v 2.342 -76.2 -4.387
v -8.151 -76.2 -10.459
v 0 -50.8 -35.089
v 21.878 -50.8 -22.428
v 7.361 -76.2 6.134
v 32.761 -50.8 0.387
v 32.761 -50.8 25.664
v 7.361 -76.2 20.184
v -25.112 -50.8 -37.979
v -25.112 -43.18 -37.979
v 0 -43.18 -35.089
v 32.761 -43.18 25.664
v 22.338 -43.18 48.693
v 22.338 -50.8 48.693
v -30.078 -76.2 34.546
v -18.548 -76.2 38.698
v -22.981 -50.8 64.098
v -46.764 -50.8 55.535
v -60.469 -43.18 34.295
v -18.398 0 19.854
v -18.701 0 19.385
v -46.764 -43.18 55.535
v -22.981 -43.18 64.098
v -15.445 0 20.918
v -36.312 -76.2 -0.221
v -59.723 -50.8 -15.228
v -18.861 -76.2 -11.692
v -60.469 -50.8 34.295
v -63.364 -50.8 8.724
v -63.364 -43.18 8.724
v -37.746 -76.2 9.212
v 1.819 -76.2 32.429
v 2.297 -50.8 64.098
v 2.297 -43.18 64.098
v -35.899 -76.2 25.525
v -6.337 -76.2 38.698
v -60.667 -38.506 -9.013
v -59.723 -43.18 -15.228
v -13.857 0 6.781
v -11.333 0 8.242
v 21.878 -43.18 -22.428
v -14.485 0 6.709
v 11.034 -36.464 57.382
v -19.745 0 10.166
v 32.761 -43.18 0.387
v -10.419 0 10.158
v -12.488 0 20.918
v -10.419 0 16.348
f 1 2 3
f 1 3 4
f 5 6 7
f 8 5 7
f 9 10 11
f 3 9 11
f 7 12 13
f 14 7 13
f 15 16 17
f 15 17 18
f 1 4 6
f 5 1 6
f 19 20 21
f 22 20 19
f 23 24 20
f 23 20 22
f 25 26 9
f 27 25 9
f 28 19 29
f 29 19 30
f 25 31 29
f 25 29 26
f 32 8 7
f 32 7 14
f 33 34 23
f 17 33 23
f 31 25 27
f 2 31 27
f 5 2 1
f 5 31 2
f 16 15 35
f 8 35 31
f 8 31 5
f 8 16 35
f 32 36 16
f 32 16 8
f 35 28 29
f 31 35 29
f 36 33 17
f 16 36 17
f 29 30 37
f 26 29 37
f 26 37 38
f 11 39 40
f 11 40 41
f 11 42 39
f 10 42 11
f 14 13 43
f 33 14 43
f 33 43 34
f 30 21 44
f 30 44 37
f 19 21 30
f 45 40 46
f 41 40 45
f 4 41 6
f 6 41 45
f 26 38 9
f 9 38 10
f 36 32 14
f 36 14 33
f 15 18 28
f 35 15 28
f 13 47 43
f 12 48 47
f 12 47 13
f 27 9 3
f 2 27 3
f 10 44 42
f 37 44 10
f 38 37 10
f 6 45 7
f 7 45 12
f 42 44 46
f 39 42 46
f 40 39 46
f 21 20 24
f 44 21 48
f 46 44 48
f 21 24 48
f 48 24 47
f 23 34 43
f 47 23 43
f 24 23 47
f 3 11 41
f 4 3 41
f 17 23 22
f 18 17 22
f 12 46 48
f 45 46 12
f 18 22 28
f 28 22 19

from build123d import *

# Parameters (mm, degrees)
F1_DEPTH     = 76.2
F2_SIZE      = 25.4
F3_T1_DEPTH  = 325.0997163693
F3_T3_DEPTH  = 325.0997163693
F3_T5_DEPTH  = 247.368026375
F3_T7_DEPTH  = 325.557153853
F3_T9_DEPTH  = 263.50961712
F3_T11_DEPTH = 247.368026375
F3_T13_DEPTH = 247.368026375
F3_T15_DEPTH = 247.368026375
F3_T17_DEPTH = 247.368026375
F3_T19_DEPTH = 247.368026375
F3_T24_DEPTH = 324.0493372034
F3_T29_DEPTH = 324.0493372034
F3_T34_DEPTH = 247.368026375
F3_T39_DEPTH = 247.368026375


# Not quite as in the source:
# - a fillet or chamfer that OpenCascade refuses, or shapes differently, is made with other operations: its cross-section is extruded or revolved along the edge and cut away or added


with BuildPart() as f1:
    # F0 (on Front) → F1 (new body)
    with BuildSketch(Plane.XZ):
        Polygon((-22.9806532577, 64.0975162387), (-46.7637702823, 55.5351264775), (-60.4687564512, 34.2954342025), (-63.3636489511, 8.723853156), (-59.7226433456, -15.2280917391), (-25.1116699455, -37.9793605928), (0, -35.0888232076), (21.8782797456, -22.4281735718), (32.7606478844, 0.3868486179), (32.7606478844, 25.6643321522), (22.3381376327, 48.6930632045), (2.2968302766, 64.0975162387), align=None)
    extrude(amount=F1_DEPTH)

    # F2
    f2_edges = [f1.edges().sort_by_distance(p)[0] for p in [
        (-61.543146, -76.2, -3.252119),
        (-42.417157, -76.2, -26.603726),
        (-12.555835, -76.2, -36.534092),
        (10.93914, -76.2, -28.758498),
        (27.319464, -76.2, -11.020662),
        (32.760648, -76.2, 13.02559),
        (27.549393, -76.2, 37.178698),
        (12.317484, -76.2, 56.39529),
        (-10.341911, -76.2, 64.097516),
        (-34.872212, -76.2, 59.816321),
        (-53.616263, -76.2, 44.91528),
        (-61.916203, -76.2, 21.509644),
    ]]
    chamfer(f2_edges, length=F2_SIZE)

    # F3: chamfer of 43.18 on 12 edges, made by hand

    # F3_s2 → F3_t1 (cut)
    with BuildSketch(Plane.YZ.offset(-211.7576146723)):
        Polygon((-43.18, 64.0975162387), (0, 20.9175162387), (0, 64.0975162387), align=None)
    extrude(amount=F3_T1_DEPTH, mode=Mode.SUBTRACT)

    # F3_s4 → F3_t3 (cut)
    with BuildSketch(Plane(origin=(177.7014842233, 0, 63.9760283522), x_dir=(0, 1, 0), z_dir=(-0.9408815158, 0, -0.3387358457))):
        Polygon((0, -24.9125392558), (-43.18, -68.0925392558), (0, -68.0925392558), align=None)
    extrude(amount=F3_T3_DEPTH, mode=Mode.SUBTRACT)

    # F3_s6 → F3_t5 (cut)
    with BuildSketch(Plane(origin=(71.76035528, 0, 111.212652454), x_dir=(0, 1, 0), z_dir=(-0.5421815882, 0, -0.8402613435))):
        Polygon((0, -26.2239115206), (-43.18, -69.4039115206), (0, -69.4039115206), align=None)
    extrude(amount=F3_T5_DEPTH, mode=Mode.SUBTRACT)

    # F3_s8 → F3_t7 (cut)
    with BuildSketch(Plane(origin=(15.5595712054, 0, 137.4430436178), x_dir=(0, 1, 0), z_dir=(-0.1124888822, 0, -0.9936529834))):
        Polygon((0, -20.7628153082), (-43.18, -63.9428153082), (0, -63.9428153082), align=None)
    extrude(amount=F3_T7_DEPTH, mode=Mode.SUBTRACT)

    # F3_s10 → F3_t9 (cut)
    with BuildSketch(Plane(origin=(-127.5057052722, 0, 83.8149377508), x_dir=(0, 1, 0), z_dir=(0.8356288498, 0, -0.5492944796))):
        Polygon((0, -2.3503510843), (-43.18, -45.5303510843), (0, -45.5303510843), align=None)
    extrude(amount=F3_T9_DEPTH, mode=Mode.SUBTRACT)

    # F3_s12 → F3_t11 (cut)
    with BuildSketch(Plane(origin=(-139.4146792436, 0, -16.0476520785), x_dir=(0, 1, 0), z_dir=(0.9934402652, 0, 0.1143522606))):
        Polygon((0, 8.3213501676), (-43.18, -34.8586498324), (0, -34.8586498324), align=None)
    extrude(amount=F3_T11_DEPTH, mode=Mode.SUBTRACT)

    # F3_s14 → F3_t13 (cut)
    with BuildSketch(Plane(origin=(-111.323834941, 0, -64.4215215589), x_dir=(0, 1, 0), z_dir=(0.8655244386, 0, 0.500866695))):
        Polygon((0, 12.8097659916), (-43.18, -30.3702340084), (0, -30.3702340084), align=None)
    extrude(amount=F3_T13_DEPTH, mode=Mode.SUBTRACT)

    # F3_s16 → F3_t15 (cut)
    with BuildSketch(Plane(origin=(-52.4668465727, 0, -109.9974062184), x_dir=(0, 1, 0), z_dir=(0.4305162784, 0, 0.9025828128))):
        Polygon((0, 13.7773469096), (-43.18, -29.4026530904), (0, -29.4026530904), align=None)
    extrude(amount=F3_T15_DEPTH, mode=Mode.SUBTRACT)

    # F3_s18 → F3_t17 (cut)
    with BuildSketch(Plane.XY.offset(-110.6584228025)):
        Polygon((-10.4193521156, 0), (32.7606478844, -43.18), (32.7606478844, 0), align=None)
    extrude(amount=F3_T17_DEPTH, mode=Mode.SUBTRACT)

    # F3_s20 → F3_t19 (cut)
    with BuildSketch(Plane(origin=(41.7156753309, 0, -92.1715637275), x_dir=(0, 1, 0), z_dir=(-0.4123238865, 0, 0.9110373278))):
        Polygon((0, 2.7518097175), (-43.18, -40.4281902825), (0, -40.4281902825), align=None)
    extrude(amount=F3_T19_DEPTH, mode=Mode.SUBTRACT)


with BuildPart() as f3_tool22:
    # F3_s23 → F3_t24 (new body)
    with BuildSketch(Plane(origin=(-31.0979390453, 0, 204.5742860839), x_dir=(0, 1, 0), z_dir=(0.150286454, 0, -0.9886424944))):
        Polygon((0, -18.1529189981), (-43.18, -61.3329189981), (0, -61.3329189981), align=None)
    extrude(amount=F3_T24_DEPTH)

    split(bisect_by=Plane(origin=(-10.3155166871, 10.3814076541, 1.1677929431), x_dir=(-0.7093543397, -0.7048520559, 0), z_dir=(-0.7026187627, 0.7071067812, 0.0795416514)), keep=Keep.TOP)


with BuildPart() as f1_1:
    add(f1.part)

    # F3_t21: cut F3_tool22
    add(f3_tool22.part, mode=Mode.SUBTRACT)


with BuildPart() as f3_tool27:
    # F3_s28 → F3_t29 (new body)
    with BuildSketch(Plane(origin=(-31.0979390453, 0, 204.5742860839), x_dir=(0, 1, 0), z_dir=(0.150286454, 0, -0.9886424944))):
        Polygon((0, -18.1529189981), (-43.18, -61.3329189981), (0, -61.3329189981), align=None)
    extrude(amount=F3_T29_DEPTH)

    split(bisect_by=Plane(origin=(-0.6455174379, 1.1751755422, -0.9820105866), x_dir=(-0.876476897, -0.481443921, 0), z_dir=(-0.3884098514, 0.7071067812, -0.5908788263)), keep=Keep.TOP)


with BuildPart() as f1_2:
    add(f1_1.part)

    # F3_t26: cut F3_tool27
    add(f3_tool27.part, mode=Mode.SUBTRACT)


with BuildPart() as f3_tool32:
    # F3_s33 → F3_t34 (new body)
    with BuildSketch(Plane(origin=(78.5572793932, 0, -60.3818852432), x_dir=(0, 1, 0), z_dir=(-0.7928521575, 0, 0.609414027))):
        Polygon((-43.18, -52.2195746281), (0, -9.0395746281), (0, -52.2195746281), align=None)
    extrude(amount=F3_T34_DEPTH)

    split(bisect_by=Plane(origin=(-1.2535006858, -1.3759048587, -0.5673184388), x_dir=(-0.7392234901, 0.6734601931, 0), z_dir=(0.6442006724, 0.7071067812, 0.2915570162)), keep=Keep.TOP)


with BuildPart() as f1_3:
    add(f1_2.part)

    # F3_t31: cut F3_tool32
    add(f3_tool32.part, mode=Mode.SUBTRACT)


with BuildPart() as f3_tool37:
    # F3_s38 → F3_t39 (new body)
    with BuildSketch(Plane(origin=(78.5572793932, 0, -60.3818852432), x_dir=(0, 1, 0), z_dir=(-0.7928521575, 0, 0.609414027))):
        Polygon((-43.18, -52.2195746281), (0, -9.0395746281), (0, -52.2195746281), align=None)
    extrude(amount=F3_T39_DEPTH)

    split(bisect_by=Plane(origin=(0, 10.4587581193, 10.4587581193), x_dir=(1, 0, 0), z_dir=(0, 0.7071067812, 0.7071067812)), keep=Keep.TOP)


with BuildPart() as f1_4:
    add(f1_3.part)

    # F3_t36: cut F3_tool37
    add(f3_tool37.part, mode=Mode.SUBTRACT)


solid = f1_4.part
